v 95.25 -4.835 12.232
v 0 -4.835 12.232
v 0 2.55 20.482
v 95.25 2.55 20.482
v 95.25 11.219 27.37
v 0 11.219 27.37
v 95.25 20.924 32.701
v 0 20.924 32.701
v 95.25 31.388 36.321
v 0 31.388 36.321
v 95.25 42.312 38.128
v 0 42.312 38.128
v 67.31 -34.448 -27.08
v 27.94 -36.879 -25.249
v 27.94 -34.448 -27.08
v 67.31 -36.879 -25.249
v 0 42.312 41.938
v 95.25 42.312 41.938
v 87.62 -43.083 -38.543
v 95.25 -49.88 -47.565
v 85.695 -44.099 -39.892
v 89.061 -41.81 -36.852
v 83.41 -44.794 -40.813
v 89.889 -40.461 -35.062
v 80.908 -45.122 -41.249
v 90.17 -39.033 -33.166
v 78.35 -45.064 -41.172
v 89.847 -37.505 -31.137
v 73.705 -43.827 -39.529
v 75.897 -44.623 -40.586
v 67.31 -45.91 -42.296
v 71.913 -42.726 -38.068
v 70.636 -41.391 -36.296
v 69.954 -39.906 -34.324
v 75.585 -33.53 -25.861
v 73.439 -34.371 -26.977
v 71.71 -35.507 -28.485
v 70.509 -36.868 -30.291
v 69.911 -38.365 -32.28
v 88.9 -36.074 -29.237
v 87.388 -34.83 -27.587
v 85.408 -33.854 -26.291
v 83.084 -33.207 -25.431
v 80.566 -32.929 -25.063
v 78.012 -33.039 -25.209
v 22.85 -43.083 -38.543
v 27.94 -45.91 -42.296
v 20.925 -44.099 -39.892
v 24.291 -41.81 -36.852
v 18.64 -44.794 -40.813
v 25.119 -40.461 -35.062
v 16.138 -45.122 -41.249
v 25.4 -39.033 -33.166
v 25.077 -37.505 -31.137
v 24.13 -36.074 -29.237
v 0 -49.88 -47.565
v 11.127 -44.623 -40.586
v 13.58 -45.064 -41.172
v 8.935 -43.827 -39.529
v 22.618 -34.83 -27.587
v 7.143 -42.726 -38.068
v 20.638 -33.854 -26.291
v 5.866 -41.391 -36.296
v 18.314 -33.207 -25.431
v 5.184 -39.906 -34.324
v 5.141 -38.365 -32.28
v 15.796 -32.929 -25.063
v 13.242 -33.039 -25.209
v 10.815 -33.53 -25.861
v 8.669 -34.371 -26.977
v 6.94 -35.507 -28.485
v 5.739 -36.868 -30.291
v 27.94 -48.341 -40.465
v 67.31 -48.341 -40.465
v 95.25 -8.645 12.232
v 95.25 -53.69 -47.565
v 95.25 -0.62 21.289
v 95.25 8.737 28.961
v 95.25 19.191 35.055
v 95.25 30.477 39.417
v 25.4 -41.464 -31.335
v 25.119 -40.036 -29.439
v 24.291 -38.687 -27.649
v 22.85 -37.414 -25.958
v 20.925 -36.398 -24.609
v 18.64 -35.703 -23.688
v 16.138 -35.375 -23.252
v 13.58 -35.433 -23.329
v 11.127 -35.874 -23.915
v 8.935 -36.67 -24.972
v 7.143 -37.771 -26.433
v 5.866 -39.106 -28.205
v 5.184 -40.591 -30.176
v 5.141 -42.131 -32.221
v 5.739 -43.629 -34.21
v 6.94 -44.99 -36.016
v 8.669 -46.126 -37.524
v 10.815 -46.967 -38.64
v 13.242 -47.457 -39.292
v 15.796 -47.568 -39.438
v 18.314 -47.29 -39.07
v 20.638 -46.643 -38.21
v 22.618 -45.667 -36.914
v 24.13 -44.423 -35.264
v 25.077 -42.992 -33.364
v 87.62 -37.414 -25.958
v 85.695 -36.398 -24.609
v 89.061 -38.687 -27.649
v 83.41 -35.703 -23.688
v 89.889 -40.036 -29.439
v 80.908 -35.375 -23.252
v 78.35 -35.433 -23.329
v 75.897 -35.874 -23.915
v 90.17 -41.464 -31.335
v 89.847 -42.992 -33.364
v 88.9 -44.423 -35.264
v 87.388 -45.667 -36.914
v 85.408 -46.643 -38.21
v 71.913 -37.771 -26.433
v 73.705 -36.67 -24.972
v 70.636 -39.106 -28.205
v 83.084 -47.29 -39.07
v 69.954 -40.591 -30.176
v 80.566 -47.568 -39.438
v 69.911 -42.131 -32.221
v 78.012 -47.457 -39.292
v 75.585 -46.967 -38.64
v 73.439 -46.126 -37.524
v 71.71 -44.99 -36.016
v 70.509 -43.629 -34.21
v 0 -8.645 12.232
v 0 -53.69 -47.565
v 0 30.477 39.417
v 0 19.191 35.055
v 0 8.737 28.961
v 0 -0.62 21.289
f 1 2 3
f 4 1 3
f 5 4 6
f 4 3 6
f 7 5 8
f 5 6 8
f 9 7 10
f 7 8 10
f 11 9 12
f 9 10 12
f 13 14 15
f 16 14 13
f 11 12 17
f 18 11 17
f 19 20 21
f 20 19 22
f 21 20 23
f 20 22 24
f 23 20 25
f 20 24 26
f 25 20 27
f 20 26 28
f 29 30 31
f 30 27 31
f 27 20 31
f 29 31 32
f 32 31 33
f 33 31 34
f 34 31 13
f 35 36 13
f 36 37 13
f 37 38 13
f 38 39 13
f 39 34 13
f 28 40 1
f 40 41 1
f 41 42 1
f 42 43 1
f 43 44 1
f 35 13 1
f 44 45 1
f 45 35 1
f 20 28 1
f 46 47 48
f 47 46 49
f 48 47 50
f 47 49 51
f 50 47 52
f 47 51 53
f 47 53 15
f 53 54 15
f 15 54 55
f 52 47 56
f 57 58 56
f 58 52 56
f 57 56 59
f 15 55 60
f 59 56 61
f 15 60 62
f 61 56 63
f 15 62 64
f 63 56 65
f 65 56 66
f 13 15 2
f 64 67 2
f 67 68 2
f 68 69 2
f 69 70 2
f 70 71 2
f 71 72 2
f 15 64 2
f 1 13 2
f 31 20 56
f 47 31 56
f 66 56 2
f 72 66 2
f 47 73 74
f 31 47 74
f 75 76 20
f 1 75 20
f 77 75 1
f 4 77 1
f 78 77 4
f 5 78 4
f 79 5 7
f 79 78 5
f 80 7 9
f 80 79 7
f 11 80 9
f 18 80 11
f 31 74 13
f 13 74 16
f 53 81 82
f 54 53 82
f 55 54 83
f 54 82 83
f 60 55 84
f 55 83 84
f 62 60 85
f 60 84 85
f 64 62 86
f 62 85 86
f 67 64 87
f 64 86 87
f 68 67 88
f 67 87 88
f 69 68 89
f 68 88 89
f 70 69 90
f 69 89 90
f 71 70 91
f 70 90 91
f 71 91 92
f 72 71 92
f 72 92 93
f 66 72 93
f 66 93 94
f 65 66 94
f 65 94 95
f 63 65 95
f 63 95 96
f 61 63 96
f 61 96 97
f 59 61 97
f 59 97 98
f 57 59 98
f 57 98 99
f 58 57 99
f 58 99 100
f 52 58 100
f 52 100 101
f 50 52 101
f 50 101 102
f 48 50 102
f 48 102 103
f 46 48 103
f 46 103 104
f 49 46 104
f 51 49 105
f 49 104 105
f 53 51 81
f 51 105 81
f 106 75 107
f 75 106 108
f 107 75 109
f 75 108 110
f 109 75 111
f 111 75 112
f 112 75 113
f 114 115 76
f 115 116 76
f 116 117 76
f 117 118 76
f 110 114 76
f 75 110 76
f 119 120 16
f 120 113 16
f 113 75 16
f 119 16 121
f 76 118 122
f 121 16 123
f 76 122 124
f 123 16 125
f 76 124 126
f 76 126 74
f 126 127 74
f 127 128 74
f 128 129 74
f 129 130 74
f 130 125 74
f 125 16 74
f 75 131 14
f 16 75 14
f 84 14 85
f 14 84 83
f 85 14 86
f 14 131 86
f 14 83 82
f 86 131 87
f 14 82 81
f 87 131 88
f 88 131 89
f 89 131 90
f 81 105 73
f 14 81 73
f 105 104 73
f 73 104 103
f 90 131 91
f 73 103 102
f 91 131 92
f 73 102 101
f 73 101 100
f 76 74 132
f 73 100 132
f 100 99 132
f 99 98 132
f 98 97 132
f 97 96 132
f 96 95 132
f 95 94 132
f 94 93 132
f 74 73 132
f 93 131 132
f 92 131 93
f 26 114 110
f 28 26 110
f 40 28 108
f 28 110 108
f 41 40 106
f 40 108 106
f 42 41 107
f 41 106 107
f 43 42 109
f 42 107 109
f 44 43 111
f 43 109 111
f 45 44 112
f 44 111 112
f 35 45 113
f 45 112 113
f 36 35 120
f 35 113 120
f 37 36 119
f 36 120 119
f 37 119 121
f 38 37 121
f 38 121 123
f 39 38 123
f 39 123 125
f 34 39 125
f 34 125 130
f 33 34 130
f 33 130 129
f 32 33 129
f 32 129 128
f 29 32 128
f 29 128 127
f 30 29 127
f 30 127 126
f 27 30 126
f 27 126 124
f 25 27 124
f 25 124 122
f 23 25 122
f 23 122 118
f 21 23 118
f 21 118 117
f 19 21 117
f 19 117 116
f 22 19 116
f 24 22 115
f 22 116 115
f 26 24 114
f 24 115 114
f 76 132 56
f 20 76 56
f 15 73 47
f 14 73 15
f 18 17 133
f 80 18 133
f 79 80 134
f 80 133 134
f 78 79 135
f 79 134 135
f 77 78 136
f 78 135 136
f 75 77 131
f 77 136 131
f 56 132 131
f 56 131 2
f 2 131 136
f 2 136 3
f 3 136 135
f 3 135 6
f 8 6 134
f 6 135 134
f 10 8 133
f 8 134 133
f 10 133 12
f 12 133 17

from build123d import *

# Parameters (mm, degrees)
F1_DEPTH = 95.25
F2_R     = 10.16
F2_W     = 39.37
F2_H     = 19.05
F3_DEPTH = 25.4


with BuildPart() as f1:
    # F0 (on Right) → F1 (new body)
    with BuildSketch(Plane.YZ):
        with BuildLine():
            ThreePointArc((42.311873, 41.937777), (13.84255, 32.215467), (-8.645249, 12.232359))
            Line((-8.645249, 12.232359), (-53.689915, -47.56531))
            Line((-53.689915, -47.56531), (-49.879915, -47.56531))
            Line((-49.879915, -47.56531), (-4.835249, 12.232359))
            ThreePointArc((-4.835249, 12.232359), (15.95876, 30.240728), (42.311873, 38.127777))
            Line((42.311873, 38.127777), (42.311873, 41.937777))
        make_face()
    extrude(amount=F1_DEPTH)

    # F2 (on face) → F3 (cut)
    with BuildSketch(Plane(origin=(0, -11.394199, 8.583075), x_dir=(1, 0, 0), z_dir=(0, -0.798739, 0.601678))):
        with Locations((15.24, -49.976293)):
            Circle(F2_R)
        with Locations((47.625, -51.881293)):
            Rectangle(F2_W, F2_H)
        with Locations((80.01, -49.976293)):
            Circle(F2_R)
    extrude(amount=-F3_DEPTH, mode=Mode.SUBTRACT)


solid = f1.part
